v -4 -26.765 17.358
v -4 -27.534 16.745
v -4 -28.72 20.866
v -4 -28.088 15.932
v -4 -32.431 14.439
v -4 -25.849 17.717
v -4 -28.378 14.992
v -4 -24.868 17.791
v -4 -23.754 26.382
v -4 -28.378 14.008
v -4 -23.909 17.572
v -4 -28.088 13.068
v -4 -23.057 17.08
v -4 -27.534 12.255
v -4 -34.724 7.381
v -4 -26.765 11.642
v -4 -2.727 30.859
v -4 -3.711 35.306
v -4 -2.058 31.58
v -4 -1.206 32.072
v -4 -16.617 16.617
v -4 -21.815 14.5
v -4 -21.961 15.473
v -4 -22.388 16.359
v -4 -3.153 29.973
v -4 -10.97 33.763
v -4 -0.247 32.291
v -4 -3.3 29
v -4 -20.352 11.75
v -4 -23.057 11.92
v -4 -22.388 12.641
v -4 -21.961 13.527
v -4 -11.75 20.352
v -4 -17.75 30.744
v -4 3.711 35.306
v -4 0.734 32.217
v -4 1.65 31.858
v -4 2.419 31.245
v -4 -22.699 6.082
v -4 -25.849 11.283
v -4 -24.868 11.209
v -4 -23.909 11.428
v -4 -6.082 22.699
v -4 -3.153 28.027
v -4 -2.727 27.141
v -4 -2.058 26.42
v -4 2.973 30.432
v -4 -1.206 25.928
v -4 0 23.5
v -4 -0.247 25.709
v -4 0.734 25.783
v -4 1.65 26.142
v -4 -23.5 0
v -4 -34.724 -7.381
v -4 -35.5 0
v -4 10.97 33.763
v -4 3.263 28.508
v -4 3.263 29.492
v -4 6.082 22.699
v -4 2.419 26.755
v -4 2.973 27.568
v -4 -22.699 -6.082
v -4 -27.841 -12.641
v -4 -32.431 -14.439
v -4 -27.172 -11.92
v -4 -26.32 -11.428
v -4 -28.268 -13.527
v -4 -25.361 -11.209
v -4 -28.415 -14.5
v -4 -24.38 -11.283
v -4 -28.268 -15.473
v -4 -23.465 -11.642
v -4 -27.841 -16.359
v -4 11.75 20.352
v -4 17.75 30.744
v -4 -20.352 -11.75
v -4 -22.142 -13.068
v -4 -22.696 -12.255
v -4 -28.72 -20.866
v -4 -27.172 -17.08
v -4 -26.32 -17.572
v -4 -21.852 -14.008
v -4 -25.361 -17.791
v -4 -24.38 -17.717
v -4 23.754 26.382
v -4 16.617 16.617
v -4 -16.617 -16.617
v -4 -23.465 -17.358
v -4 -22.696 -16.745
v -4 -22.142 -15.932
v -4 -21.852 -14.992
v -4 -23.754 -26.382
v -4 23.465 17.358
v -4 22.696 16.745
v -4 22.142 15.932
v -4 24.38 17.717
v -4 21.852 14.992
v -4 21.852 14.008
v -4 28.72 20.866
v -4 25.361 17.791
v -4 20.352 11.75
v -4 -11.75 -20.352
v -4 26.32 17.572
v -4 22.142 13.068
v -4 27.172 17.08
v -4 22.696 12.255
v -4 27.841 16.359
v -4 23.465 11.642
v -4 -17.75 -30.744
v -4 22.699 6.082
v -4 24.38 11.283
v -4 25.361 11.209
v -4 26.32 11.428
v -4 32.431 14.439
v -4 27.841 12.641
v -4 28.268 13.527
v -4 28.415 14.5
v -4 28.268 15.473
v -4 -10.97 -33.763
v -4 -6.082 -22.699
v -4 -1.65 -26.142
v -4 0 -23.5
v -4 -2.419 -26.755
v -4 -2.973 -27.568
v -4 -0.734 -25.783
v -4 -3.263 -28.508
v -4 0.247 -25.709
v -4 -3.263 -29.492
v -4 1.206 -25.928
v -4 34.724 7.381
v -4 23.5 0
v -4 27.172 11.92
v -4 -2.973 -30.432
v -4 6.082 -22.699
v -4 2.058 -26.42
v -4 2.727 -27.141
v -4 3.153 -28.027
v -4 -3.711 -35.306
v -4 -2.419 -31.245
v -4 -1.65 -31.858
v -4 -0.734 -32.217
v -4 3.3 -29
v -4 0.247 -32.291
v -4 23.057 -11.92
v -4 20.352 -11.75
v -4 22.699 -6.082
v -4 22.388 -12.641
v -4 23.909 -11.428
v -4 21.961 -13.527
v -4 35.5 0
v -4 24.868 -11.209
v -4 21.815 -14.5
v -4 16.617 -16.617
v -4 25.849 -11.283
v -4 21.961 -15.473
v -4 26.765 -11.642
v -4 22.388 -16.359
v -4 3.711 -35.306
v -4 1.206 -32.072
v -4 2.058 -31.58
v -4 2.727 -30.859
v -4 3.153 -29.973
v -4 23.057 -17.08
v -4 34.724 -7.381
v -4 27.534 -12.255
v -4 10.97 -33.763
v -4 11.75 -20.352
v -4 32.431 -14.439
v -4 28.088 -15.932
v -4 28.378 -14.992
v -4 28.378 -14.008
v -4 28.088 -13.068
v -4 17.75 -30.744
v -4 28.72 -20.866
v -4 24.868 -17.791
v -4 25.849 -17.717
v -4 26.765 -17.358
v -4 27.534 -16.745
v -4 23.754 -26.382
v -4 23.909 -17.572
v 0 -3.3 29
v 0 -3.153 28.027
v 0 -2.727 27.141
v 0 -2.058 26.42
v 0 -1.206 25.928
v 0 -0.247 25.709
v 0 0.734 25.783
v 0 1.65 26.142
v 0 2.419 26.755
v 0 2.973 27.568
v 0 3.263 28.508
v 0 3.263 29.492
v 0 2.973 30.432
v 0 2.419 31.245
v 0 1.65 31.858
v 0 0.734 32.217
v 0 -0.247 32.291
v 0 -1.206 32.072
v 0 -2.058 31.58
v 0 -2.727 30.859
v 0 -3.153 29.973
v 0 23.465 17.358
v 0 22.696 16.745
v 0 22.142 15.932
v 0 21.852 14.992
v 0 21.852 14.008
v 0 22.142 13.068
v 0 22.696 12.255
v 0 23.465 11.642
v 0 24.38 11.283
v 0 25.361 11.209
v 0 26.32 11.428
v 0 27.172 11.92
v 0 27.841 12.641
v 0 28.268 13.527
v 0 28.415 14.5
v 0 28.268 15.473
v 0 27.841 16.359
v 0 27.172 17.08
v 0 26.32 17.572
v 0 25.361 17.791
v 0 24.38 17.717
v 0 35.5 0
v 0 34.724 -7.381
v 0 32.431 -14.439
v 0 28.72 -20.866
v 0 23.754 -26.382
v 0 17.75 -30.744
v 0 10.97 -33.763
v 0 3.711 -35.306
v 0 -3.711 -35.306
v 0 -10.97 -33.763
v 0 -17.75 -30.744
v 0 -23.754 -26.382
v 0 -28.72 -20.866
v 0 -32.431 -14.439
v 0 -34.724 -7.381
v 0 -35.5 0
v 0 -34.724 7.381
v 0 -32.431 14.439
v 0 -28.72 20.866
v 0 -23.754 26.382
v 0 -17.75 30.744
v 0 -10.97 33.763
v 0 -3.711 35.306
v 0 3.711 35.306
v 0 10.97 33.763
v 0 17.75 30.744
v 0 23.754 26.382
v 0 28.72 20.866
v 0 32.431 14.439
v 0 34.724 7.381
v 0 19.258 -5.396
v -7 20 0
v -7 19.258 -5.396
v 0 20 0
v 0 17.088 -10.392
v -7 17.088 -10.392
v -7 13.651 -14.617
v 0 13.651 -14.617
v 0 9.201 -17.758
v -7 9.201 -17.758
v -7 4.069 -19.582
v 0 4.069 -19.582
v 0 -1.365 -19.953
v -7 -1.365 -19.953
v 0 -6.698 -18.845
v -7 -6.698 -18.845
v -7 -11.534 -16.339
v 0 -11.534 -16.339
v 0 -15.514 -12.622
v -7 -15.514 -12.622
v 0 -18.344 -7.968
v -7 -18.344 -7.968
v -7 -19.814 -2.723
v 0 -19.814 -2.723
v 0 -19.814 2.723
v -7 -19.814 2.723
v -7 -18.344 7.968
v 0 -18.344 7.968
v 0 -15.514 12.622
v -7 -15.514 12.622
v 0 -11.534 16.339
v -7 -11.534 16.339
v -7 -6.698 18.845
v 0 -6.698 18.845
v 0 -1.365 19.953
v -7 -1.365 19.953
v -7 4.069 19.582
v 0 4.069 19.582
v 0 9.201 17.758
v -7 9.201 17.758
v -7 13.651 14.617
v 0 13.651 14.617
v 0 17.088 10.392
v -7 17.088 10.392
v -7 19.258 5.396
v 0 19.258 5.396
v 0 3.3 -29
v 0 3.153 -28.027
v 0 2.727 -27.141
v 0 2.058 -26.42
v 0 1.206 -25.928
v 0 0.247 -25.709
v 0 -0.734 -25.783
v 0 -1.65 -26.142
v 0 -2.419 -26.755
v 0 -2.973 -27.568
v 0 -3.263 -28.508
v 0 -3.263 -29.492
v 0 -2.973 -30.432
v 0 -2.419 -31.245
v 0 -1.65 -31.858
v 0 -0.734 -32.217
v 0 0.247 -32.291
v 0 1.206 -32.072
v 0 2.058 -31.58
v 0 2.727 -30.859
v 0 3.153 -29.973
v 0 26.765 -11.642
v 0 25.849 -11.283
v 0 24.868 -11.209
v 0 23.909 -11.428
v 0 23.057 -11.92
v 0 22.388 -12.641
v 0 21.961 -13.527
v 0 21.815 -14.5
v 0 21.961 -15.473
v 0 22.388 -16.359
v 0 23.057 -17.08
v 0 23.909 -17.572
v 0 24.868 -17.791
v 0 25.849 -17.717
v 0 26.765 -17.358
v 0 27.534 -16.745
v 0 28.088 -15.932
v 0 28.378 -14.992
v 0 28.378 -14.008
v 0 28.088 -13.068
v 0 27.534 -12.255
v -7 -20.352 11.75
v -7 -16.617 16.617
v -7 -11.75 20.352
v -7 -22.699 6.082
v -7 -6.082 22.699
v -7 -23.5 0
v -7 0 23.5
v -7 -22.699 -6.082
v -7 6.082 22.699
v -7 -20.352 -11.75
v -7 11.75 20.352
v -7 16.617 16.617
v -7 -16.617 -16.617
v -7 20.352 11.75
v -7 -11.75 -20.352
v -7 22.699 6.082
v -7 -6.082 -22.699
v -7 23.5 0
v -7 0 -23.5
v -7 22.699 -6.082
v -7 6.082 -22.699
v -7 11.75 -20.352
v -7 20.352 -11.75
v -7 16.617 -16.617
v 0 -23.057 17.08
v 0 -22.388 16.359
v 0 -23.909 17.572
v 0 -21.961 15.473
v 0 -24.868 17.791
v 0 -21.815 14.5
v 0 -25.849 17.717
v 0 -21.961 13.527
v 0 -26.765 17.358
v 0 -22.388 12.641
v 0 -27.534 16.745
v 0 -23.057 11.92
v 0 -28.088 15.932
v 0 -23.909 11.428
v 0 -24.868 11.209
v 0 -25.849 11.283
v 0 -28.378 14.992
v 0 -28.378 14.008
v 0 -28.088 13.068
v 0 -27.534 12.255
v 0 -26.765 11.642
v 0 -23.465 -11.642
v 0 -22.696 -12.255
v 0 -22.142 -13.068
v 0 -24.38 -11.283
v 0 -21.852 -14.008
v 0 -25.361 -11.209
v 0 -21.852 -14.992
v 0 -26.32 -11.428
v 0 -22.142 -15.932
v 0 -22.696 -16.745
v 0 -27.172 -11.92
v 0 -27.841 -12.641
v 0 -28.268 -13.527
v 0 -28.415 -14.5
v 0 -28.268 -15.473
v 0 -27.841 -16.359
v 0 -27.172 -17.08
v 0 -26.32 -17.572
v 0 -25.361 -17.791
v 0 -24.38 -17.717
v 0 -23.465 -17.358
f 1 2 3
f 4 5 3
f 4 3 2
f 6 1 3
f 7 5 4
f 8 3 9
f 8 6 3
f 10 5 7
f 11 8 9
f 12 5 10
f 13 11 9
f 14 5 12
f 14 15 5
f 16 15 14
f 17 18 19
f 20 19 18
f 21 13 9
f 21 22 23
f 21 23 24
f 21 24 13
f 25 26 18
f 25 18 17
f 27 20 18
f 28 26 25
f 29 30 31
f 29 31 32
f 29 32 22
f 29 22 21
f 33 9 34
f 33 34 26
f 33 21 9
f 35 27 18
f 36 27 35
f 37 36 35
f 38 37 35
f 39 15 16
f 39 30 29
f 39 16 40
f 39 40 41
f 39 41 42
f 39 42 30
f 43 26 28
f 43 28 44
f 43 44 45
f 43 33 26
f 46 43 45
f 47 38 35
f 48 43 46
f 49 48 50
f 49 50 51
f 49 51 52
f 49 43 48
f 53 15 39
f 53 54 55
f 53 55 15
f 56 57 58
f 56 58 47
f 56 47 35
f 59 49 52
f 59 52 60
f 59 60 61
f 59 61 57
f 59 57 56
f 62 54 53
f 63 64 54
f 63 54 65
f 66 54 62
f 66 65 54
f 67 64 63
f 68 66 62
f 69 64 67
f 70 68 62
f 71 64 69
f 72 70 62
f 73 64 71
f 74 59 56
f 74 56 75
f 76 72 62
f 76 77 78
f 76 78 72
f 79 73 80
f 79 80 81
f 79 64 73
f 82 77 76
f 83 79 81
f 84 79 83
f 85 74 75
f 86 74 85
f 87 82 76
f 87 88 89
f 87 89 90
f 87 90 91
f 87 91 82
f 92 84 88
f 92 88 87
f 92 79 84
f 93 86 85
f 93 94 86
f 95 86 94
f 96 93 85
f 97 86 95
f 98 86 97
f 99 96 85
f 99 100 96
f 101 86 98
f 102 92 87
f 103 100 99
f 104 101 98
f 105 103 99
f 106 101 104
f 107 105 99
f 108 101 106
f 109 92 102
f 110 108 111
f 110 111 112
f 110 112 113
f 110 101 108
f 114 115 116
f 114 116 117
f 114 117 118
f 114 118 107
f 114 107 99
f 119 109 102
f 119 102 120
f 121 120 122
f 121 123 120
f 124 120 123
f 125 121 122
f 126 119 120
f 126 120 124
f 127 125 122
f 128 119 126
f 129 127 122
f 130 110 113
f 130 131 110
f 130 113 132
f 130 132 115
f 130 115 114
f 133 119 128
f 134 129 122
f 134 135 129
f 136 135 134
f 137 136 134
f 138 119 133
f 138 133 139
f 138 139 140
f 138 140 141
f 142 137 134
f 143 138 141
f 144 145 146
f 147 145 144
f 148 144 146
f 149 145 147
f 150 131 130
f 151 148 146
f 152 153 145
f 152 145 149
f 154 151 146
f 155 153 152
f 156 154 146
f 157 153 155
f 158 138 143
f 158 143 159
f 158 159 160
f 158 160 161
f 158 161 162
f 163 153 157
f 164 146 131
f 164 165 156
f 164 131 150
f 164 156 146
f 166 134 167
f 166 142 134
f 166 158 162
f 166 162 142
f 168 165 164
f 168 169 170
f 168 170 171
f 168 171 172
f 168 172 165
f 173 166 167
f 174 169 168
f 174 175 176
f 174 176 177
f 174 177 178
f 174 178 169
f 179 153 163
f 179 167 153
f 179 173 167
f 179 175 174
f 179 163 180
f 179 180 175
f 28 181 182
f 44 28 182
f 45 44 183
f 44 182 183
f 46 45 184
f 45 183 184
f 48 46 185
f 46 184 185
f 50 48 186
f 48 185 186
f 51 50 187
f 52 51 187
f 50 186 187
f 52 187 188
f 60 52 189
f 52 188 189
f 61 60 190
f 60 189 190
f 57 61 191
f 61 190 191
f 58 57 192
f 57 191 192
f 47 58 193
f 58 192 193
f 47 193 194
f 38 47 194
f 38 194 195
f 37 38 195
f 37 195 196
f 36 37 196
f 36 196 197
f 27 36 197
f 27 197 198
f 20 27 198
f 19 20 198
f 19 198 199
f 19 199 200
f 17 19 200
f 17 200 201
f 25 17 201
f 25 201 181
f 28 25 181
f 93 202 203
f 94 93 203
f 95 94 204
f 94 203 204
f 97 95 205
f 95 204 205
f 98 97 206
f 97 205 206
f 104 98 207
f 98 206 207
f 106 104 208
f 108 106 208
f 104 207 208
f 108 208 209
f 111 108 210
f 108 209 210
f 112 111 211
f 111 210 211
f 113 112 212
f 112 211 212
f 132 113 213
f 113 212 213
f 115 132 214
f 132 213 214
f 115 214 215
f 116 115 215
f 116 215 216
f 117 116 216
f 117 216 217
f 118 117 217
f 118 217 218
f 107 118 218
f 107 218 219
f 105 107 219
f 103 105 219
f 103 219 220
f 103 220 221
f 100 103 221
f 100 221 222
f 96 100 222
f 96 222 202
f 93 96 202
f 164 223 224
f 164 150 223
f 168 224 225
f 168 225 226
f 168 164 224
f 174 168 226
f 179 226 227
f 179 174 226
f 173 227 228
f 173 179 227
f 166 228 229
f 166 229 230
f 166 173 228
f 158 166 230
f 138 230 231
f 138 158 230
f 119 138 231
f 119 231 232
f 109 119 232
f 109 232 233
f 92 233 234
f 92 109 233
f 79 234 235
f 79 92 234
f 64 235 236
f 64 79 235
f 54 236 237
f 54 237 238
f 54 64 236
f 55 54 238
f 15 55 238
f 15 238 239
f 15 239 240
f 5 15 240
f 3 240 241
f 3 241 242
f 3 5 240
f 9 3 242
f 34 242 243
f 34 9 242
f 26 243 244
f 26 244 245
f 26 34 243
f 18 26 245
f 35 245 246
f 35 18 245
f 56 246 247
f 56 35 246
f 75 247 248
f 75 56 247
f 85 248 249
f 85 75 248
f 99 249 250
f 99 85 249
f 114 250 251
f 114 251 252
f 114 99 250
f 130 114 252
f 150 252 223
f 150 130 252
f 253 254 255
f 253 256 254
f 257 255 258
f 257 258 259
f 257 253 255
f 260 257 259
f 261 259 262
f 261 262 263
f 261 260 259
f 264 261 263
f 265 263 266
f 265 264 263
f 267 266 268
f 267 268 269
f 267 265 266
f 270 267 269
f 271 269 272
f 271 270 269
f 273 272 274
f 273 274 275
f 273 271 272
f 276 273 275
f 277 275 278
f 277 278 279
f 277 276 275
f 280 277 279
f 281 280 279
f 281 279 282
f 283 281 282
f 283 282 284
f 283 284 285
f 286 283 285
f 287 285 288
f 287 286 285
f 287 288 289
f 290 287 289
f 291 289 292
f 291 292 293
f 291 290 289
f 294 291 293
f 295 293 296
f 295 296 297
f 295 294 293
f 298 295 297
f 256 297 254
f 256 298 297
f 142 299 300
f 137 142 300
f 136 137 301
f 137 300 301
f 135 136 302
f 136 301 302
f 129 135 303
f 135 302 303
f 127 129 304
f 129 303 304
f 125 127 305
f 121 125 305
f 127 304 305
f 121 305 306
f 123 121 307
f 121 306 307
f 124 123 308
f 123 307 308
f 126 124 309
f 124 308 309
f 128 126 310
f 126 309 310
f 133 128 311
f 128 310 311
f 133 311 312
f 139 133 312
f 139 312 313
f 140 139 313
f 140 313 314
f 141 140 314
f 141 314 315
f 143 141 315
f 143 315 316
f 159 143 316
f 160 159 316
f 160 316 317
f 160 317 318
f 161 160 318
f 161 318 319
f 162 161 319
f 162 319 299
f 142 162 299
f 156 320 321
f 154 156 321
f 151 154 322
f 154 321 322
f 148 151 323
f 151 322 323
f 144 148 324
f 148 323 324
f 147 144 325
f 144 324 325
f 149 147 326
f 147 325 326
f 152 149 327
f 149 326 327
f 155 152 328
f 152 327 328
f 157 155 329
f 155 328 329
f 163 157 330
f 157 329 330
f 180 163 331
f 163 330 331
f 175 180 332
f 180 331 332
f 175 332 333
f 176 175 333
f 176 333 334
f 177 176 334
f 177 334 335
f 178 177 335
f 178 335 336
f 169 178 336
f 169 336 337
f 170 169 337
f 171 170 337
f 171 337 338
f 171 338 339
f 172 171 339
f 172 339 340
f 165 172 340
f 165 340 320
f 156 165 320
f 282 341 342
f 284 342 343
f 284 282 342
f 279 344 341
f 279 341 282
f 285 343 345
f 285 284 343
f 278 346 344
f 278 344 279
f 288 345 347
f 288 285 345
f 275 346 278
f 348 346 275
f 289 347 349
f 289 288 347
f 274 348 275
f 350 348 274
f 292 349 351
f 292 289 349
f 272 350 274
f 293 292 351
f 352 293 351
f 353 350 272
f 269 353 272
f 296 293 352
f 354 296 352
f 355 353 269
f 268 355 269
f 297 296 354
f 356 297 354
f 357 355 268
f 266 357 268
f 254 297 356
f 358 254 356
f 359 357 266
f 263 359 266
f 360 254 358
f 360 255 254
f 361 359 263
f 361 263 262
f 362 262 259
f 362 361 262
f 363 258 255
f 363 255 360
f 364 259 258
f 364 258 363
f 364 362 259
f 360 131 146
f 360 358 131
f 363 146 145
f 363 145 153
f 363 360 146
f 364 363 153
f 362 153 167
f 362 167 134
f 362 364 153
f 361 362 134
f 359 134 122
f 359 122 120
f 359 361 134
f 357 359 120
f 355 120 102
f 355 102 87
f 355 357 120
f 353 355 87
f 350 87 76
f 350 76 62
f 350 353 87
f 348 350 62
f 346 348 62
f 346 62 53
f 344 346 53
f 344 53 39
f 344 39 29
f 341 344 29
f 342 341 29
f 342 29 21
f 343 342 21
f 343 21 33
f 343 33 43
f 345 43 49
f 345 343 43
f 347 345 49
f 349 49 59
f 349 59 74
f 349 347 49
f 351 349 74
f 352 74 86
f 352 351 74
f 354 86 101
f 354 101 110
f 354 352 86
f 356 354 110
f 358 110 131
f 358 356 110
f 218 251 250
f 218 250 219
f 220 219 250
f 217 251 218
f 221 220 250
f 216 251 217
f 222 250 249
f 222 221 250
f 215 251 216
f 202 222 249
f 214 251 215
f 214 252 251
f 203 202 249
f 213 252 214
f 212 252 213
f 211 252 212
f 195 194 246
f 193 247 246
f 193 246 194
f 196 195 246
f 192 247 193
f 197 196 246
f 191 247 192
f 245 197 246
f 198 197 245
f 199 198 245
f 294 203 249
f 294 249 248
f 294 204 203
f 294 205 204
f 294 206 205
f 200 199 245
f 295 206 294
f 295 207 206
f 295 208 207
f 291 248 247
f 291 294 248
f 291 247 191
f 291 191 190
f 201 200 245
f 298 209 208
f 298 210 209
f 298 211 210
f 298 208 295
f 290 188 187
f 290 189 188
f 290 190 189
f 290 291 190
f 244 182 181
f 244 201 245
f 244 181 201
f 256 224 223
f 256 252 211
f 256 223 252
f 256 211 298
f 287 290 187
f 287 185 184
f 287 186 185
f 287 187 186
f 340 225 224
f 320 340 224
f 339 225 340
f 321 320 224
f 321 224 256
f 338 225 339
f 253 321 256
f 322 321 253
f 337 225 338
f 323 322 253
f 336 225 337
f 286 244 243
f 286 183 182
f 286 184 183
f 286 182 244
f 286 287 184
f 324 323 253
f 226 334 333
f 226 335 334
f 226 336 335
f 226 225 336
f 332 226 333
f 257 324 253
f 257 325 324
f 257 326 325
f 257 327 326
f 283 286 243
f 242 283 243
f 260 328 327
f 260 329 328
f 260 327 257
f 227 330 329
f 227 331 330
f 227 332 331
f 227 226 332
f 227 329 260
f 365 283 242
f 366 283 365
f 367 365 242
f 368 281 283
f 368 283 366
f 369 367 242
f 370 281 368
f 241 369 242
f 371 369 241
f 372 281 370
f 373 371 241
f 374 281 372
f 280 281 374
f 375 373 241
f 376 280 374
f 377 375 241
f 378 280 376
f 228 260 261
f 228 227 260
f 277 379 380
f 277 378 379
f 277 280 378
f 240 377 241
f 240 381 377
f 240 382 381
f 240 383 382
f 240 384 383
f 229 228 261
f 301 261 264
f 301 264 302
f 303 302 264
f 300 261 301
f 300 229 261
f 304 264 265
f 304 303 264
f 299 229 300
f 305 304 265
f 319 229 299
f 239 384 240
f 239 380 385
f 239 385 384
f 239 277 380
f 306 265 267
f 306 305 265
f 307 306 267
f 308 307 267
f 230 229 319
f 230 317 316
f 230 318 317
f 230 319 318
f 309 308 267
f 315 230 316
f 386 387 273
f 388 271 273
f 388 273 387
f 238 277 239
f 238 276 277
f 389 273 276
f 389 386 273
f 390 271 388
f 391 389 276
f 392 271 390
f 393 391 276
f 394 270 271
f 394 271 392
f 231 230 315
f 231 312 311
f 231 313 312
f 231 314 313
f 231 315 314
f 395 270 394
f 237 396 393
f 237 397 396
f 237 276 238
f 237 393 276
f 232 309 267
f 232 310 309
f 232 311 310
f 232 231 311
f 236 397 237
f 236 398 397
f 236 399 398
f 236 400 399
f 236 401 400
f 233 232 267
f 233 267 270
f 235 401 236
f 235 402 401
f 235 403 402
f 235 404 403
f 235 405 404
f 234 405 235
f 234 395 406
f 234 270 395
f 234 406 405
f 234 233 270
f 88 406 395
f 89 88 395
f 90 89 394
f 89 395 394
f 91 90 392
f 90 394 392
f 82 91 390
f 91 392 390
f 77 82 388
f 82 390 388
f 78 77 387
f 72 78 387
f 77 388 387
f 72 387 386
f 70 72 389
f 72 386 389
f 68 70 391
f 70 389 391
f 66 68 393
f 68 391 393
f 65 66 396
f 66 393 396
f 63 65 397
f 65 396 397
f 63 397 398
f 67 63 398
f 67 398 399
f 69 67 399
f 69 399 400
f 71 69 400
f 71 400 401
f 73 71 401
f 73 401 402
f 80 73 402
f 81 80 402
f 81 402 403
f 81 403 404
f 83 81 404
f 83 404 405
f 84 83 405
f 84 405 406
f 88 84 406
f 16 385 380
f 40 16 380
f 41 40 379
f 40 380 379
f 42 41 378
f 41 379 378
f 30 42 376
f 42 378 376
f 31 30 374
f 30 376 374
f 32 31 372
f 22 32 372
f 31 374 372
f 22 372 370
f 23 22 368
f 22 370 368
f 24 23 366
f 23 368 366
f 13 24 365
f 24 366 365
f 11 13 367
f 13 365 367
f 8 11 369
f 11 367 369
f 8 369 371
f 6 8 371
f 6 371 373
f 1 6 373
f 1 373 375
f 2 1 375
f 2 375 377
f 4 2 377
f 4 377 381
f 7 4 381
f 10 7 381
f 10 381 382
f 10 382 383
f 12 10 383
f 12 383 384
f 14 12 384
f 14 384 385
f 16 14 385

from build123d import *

# Parameters (mm, degrees)
M6_CLEARANCE_HOLE1_D     = 6.6
M6_CLEARANCE_HOLE1_DEPTH = 4
CIRPATTERN1_COUNT        = 6


with BuildPart() as part:
    # Sketch2 → Revolve1 (revolve)
    with BuildSketch(Plane.XY):
        Polygon((-7, 23.5), (-7, 20), (0, 20), (0, 35.5), (-4, 35.5), (-4, 23.5), align=None)
    revolve(axis=Axis((0, 0, 0), (-1, 0, 0)))

    # M6 Clearance Hole1
    with Locations(Plane(origin=(-4, 0, -29), x_dir=(0, -1, 0), z_dir=(-1, 0, 0))):
        with Locations((0, 0)):
            m6_clearance_hole1 = Hole(M6_CLEARANCE_HOLE1_D / 2, depth=M6_CLEARANCE_HOLE1_DEPTH)

    # CirPattern1: M6 Clearance Hole1 ×6 about axis
    cirpattern1_axis = Axis((0, 0, 0), (1, 0, 0))
    for i in range(1, CIRPATTERN1_COUNT):
        add(m6_clearance_hole1.rotate(cirpattern1_axis, i * 360 / CIRPATTERN1_COUNT), mode=Mode.SUBTRACT)


solid = part.part
